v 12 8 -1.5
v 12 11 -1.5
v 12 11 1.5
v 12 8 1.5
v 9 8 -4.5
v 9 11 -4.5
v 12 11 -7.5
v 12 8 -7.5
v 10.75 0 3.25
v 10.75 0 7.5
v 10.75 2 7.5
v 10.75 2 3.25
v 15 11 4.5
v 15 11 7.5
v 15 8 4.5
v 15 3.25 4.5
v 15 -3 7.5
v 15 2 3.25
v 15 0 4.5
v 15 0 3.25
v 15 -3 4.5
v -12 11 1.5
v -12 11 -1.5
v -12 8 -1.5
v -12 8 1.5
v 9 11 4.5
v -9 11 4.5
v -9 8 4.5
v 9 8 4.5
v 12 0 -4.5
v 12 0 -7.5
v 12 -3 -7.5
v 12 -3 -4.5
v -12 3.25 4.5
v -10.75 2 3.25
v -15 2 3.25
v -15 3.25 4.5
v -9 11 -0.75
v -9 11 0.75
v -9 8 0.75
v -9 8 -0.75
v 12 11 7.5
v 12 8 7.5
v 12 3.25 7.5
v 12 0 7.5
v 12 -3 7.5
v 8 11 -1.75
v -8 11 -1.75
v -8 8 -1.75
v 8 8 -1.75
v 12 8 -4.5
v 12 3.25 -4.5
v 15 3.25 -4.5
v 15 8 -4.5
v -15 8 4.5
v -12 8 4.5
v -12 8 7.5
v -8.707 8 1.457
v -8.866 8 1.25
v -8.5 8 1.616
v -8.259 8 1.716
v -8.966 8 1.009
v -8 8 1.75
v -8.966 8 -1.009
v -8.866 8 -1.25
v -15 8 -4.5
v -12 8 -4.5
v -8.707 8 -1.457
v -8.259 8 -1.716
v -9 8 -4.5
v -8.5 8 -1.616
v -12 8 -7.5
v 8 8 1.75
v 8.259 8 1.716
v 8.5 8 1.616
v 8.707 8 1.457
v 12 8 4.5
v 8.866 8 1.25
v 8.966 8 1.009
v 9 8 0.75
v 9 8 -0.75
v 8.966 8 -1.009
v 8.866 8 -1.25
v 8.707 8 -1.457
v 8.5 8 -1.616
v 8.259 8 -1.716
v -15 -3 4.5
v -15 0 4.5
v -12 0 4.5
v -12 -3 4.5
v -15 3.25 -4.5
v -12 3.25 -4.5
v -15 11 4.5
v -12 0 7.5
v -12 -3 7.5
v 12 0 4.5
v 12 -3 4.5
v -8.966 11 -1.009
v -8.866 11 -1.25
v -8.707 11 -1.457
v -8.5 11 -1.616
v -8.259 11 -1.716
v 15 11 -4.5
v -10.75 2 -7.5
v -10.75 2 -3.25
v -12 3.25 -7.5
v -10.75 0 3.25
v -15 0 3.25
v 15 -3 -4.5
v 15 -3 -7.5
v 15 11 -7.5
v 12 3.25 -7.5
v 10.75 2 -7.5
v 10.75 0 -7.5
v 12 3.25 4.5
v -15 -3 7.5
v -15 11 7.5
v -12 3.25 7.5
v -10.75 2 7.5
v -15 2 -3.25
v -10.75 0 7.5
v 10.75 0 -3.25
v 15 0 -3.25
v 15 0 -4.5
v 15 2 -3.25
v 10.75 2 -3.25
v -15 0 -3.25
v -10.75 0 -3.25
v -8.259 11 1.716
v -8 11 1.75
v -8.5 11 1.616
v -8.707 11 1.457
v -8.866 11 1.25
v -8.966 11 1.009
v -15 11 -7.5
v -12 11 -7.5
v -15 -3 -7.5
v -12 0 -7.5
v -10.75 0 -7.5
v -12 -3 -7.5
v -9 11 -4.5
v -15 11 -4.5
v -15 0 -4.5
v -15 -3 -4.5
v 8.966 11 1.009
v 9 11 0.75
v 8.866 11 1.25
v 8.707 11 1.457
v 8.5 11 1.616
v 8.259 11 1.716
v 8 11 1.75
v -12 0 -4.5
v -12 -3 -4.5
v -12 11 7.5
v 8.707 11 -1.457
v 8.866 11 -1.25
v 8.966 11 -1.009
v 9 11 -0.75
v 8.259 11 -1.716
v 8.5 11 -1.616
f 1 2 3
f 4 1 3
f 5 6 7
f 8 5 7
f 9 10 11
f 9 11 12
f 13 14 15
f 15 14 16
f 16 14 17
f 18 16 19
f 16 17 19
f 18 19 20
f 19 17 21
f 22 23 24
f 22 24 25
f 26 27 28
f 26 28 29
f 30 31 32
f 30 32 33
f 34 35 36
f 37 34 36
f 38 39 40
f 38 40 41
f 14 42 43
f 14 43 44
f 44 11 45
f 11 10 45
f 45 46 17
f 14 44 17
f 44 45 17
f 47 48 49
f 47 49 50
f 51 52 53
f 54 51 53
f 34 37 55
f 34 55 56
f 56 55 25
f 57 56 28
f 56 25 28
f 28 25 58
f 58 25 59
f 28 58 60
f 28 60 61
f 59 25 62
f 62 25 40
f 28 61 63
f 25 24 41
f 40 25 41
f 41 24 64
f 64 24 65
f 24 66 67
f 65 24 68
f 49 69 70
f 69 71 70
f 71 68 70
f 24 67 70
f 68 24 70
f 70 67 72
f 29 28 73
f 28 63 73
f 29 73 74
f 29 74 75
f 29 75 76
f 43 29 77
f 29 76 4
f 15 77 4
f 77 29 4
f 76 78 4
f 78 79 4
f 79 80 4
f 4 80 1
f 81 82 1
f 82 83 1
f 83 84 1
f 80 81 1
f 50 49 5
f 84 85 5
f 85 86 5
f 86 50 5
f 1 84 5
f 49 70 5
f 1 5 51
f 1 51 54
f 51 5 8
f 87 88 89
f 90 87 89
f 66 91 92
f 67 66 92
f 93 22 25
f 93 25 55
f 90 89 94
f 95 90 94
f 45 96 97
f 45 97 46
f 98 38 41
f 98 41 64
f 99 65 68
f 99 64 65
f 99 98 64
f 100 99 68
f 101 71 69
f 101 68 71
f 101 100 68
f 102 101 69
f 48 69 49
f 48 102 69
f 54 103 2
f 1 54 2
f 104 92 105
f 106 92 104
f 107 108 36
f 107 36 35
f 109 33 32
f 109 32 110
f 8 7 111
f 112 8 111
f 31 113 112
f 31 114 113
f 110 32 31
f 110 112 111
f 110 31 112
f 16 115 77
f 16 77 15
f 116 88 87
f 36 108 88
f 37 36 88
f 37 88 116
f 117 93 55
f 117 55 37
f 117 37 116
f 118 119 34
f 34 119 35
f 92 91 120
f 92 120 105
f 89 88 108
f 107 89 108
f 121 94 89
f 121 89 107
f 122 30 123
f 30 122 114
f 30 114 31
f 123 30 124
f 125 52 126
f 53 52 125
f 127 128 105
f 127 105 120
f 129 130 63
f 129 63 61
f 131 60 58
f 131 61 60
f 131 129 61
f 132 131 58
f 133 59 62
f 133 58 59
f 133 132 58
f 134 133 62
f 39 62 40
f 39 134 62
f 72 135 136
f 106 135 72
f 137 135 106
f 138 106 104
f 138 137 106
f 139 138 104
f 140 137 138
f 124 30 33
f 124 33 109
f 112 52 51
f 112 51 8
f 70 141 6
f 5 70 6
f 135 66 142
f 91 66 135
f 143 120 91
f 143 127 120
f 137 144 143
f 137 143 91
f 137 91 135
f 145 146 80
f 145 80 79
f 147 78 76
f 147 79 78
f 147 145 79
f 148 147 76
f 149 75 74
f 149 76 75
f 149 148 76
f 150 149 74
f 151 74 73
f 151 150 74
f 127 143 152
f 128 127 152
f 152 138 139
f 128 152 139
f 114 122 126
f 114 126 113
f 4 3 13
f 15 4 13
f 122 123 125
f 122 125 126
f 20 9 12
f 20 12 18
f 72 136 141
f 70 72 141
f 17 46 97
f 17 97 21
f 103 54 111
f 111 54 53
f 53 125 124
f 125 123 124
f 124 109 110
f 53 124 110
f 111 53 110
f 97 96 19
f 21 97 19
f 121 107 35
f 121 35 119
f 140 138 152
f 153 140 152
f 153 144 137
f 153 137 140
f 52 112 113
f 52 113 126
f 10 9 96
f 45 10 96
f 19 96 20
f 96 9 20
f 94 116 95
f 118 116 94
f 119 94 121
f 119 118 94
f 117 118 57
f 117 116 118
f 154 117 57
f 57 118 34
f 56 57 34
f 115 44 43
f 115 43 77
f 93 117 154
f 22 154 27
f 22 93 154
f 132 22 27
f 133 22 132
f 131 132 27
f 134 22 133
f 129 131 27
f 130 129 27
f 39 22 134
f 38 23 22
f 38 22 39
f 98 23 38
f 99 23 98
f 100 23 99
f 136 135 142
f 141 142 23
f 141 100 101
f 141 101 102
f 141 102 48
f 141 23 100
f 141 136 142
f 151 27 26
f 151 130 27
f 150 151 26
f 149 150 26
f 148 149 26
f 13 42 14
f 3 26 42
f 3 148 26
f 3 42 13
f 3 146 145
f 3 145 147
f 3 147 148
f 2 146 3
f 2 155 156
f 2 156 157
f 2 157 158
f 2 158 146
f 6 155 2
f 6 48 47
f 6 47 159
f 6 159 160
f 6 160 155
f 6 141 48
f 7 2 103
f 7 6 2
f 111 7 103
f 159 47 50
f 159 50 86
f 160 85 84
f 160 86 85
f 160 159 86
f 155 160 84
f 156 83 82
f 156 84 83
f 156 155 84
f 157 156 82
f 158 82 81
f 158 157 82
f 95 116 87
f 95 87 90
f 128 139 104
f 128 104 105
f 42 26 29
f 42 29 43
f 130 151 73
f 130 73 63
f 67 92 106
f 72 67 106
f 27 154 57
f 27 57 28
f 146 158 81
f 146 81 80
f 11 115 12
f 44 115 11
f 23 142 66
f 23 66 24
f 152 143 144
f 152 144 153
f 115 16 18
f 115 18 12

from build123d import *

# Parameters (mm, degrees)
SKETCH1_W             = 3
SKETCH1_H             = 3
BOSS_EXTRUDE1_DEPTH   = 8
BOSS_EXTRUDE1_2_DEPTH = 8
BOSS_EXTRUDE1_3_DEPTH = 8
BOSS_EXTRUDE1_4_DEPTH = 8
SKETCH2_W             = 30
SKETCH2_H             = 15
BOSS_EXTRUDE2_DEPTH   = 3
CUT_EXTRUDE1_DEPTH    = 21.05617112
CUT_EXTRUDE2_DEPTH    = 21.05617112
BOSS_EXTRUDE3_DEPTH   = 2
CHAMFER1_SIZE         = 1.25
SKETCH7_W             = 3
SKETCH7_H             = 3
BOSS_EXTRUDE4_DEPTH   = 3


with BuildPart() as part:
    # Sketch1 → Boss-Extrude1 (new body)
    with BuildSketch(Plane(origin=(0, 0, 0), x_dir=(1, 0, 0), z_dir=(0, 1, 0))):
        with Locations((-13.5, 6)):
            Rectangle(SKETCH1_W, SKETCH1_H)
    extrude(amount=BOSS_EXTRUDE1_DEPTH)



with BuildPart() as body_2:
    # Sketch1 → Boss-Extrude1 2 (new body)
    with BuildSketch(Plane(origin=(0, 0, 0), x_dir=(1, 0, 0), z_dir=(0, 1, 0))):
        with Locations((13.5, 6)):
            Rectangle(SKETCH1_W, SKETCH1_H)
    extrude(amount=BOSS_EXTRUDE1_2_DEPTH)


with BuildPart() as body_3:
    # Sketch1 → Boss-Extrude1 3 (new body)
    with BuildSketch(Plane(origin=(0, 0, 0), x_dir=(1, 0, 0), z_dir=(0, 1, 0))):
        with Locations((13.5, -6)):
            Rectangle(SKETCH1_W, SKETCH1_H)
    extrude(amount=BOSS_EXTRUDE1_3_DEPTH)


with BuildPart() as body_4:
    # Sketch1 → Boss-Extrude1 4 (new body)
    with BuildSketch(Plane(origin=(0, 0, 0), x_dir=(1, 0, 0), z_dir=(0, 1, 0))):
        with Locations((-13.5, -6)):
            Rectangle(SKETCH1_W, SKETCH1_H)
    extrude(amount=BOSS_EXTRUDE1_4_DEPTH)


with BuildPart() as part_1:
    add(part.part)

    add(body_2.part)  # Boss-Extrude2 merges body 2

    add(body_3.part)  # Boss-Extrude2 merges body 3

    add(body_4.part)  # Boss-Extrude2 merges body 4
    # Sketch2 → Boss-Extrude2 (add)
    with BuildSketch(Plane(origin=(0, 8, 0), x_dir=(1, 0, 0), z_dir=(0, 1, 0))):
        Rectangle(SKETCH2_W, SKETCH2_H)
    extrude(amount=BOSS_EXTRUDE2_DEPTH)

    # Sketch3 → Cut-Extrude1 (cut, through all)
    with BuildSketch(Plane(origin=(0, 11, 0), x_dir=(1, 0, 0), z_dir=(0, 1, 0))):
        Polygon((-12, 7.5), (-9, 4.5), (9, 4.5), (12, 7.5), align=None)
        Polygon((-12, -7.5), (-9, -4.5), (9, -4.5), (12, -7.5), align=None)
        Polygon((-15, 4.5), (-12, 1.5), (-12, -1.5), (-15, -4.5), align=None)
        Polygon((15, 4.5), (12, 1.5), (12, -1.5), (15, -4.5), align=None)
    extrude(amount=-CUT_EXTRUDE1_DEPTH, mode=Mode.SUBTRACT)

    # Sketch4 → Cut-Extrude2 (cut, through all)
    with BuildSketch(Plane(origin=(0, 11, 0), x_dir=(1, 0, 0), z_dir=(0, 1, 0))):
        with BuildLine():
            Line((-8, 1.75), (8, 1.75))
            ThreePointArc((8, 1.75), (8.707106781, 1.457106781), (9, 0.75))
            Line((9, 0.75), (9, -0.75))
            ThreePointArc((9, -0.75), (8.707106781, -1.457106781), (8, -1.75))
            Line((8, -1.75), (-8, -1.75))
            ThreePointArc((-8, -1.75), (-8.707106781, -1.457106781), (-9, -0.75))
            Line((-9, -0.75), (-9, 0.75))
            ThreePointArc((-9, 0.75), (-8.707106781, 1.457106781), (-8, 1.75))
        make_face()
    extrude(amount=-CUT_EXTRUDE2_DEPTH, mode=Mode.SUBTRACT)

    # Sketch6 → Boss-Extrude3 (add)
    with BuildSketch(Plane.XZ):
        Polygon((-10.75, 7.5), (-12, 7.5), (-12, 4.5), (-15, 4.5), (-15, 3.25), (-10.75, 3.25), align=None)
        Polygon((12, 4.5), (12, 7.5), (10.75, 7.5), (10.75, 3.25), (15, 3.25), (15, 4.5), align=None)
        Polygon((10.75, -7.5), (12, -7.5), (12, -4.5), (15, -4.5), (15, -3.25), (10.75, -3.25), align=None)
        Polygon((-12, -4.5), (-12, -7.5), (-10.75, -7.5), (-10.75, -3.25), (-15, -3.25), (-15, -4.5), align=None)
    extrude(amount=-BOSS_EXTRUDE3_DEPTH)

    # Chamfer1
    chamfer1_edges = [part_1.edges().sort_by_distance(p)[0] for p in [
        (-12, 2, 6),
        (-13.5, 2, 4.5),
        (-13.5, 2, -4.5),
        (-12, 2, -6),
        (12, 2, 6),
        (13.5, 2, 4.5),
        (12, 2, -6),
        (13.5, 2, -4.5),
    ]]
    chamfer(chamfer1_edges, length=CHAMFER1_SIZE - 0.0001)  # a hair under: the kernel refuses the full size

    # Sketch7 → Boss-Extrude4 (add)
    with BuildSketch(Plane.XZ):
        with Locations((-13.5, 6)):
            Rectangle(SKETCH7_W, SKETCH7_H)
        with Locations((-13.5, -6)):
            Rectangle(SKETCH7_W, SKETCH7_H)
        with Locations((13.5, -6)):
            Rectangle(SKETCH7_W, SKETCH7_H)
        with Locations((13.5, 6)):
            Rectangle(SKETCH7_W, SKETCH7_H)
    extrude(amount=BOSS_EXTRUDE4_DEPTH)


solid = part_1.part
